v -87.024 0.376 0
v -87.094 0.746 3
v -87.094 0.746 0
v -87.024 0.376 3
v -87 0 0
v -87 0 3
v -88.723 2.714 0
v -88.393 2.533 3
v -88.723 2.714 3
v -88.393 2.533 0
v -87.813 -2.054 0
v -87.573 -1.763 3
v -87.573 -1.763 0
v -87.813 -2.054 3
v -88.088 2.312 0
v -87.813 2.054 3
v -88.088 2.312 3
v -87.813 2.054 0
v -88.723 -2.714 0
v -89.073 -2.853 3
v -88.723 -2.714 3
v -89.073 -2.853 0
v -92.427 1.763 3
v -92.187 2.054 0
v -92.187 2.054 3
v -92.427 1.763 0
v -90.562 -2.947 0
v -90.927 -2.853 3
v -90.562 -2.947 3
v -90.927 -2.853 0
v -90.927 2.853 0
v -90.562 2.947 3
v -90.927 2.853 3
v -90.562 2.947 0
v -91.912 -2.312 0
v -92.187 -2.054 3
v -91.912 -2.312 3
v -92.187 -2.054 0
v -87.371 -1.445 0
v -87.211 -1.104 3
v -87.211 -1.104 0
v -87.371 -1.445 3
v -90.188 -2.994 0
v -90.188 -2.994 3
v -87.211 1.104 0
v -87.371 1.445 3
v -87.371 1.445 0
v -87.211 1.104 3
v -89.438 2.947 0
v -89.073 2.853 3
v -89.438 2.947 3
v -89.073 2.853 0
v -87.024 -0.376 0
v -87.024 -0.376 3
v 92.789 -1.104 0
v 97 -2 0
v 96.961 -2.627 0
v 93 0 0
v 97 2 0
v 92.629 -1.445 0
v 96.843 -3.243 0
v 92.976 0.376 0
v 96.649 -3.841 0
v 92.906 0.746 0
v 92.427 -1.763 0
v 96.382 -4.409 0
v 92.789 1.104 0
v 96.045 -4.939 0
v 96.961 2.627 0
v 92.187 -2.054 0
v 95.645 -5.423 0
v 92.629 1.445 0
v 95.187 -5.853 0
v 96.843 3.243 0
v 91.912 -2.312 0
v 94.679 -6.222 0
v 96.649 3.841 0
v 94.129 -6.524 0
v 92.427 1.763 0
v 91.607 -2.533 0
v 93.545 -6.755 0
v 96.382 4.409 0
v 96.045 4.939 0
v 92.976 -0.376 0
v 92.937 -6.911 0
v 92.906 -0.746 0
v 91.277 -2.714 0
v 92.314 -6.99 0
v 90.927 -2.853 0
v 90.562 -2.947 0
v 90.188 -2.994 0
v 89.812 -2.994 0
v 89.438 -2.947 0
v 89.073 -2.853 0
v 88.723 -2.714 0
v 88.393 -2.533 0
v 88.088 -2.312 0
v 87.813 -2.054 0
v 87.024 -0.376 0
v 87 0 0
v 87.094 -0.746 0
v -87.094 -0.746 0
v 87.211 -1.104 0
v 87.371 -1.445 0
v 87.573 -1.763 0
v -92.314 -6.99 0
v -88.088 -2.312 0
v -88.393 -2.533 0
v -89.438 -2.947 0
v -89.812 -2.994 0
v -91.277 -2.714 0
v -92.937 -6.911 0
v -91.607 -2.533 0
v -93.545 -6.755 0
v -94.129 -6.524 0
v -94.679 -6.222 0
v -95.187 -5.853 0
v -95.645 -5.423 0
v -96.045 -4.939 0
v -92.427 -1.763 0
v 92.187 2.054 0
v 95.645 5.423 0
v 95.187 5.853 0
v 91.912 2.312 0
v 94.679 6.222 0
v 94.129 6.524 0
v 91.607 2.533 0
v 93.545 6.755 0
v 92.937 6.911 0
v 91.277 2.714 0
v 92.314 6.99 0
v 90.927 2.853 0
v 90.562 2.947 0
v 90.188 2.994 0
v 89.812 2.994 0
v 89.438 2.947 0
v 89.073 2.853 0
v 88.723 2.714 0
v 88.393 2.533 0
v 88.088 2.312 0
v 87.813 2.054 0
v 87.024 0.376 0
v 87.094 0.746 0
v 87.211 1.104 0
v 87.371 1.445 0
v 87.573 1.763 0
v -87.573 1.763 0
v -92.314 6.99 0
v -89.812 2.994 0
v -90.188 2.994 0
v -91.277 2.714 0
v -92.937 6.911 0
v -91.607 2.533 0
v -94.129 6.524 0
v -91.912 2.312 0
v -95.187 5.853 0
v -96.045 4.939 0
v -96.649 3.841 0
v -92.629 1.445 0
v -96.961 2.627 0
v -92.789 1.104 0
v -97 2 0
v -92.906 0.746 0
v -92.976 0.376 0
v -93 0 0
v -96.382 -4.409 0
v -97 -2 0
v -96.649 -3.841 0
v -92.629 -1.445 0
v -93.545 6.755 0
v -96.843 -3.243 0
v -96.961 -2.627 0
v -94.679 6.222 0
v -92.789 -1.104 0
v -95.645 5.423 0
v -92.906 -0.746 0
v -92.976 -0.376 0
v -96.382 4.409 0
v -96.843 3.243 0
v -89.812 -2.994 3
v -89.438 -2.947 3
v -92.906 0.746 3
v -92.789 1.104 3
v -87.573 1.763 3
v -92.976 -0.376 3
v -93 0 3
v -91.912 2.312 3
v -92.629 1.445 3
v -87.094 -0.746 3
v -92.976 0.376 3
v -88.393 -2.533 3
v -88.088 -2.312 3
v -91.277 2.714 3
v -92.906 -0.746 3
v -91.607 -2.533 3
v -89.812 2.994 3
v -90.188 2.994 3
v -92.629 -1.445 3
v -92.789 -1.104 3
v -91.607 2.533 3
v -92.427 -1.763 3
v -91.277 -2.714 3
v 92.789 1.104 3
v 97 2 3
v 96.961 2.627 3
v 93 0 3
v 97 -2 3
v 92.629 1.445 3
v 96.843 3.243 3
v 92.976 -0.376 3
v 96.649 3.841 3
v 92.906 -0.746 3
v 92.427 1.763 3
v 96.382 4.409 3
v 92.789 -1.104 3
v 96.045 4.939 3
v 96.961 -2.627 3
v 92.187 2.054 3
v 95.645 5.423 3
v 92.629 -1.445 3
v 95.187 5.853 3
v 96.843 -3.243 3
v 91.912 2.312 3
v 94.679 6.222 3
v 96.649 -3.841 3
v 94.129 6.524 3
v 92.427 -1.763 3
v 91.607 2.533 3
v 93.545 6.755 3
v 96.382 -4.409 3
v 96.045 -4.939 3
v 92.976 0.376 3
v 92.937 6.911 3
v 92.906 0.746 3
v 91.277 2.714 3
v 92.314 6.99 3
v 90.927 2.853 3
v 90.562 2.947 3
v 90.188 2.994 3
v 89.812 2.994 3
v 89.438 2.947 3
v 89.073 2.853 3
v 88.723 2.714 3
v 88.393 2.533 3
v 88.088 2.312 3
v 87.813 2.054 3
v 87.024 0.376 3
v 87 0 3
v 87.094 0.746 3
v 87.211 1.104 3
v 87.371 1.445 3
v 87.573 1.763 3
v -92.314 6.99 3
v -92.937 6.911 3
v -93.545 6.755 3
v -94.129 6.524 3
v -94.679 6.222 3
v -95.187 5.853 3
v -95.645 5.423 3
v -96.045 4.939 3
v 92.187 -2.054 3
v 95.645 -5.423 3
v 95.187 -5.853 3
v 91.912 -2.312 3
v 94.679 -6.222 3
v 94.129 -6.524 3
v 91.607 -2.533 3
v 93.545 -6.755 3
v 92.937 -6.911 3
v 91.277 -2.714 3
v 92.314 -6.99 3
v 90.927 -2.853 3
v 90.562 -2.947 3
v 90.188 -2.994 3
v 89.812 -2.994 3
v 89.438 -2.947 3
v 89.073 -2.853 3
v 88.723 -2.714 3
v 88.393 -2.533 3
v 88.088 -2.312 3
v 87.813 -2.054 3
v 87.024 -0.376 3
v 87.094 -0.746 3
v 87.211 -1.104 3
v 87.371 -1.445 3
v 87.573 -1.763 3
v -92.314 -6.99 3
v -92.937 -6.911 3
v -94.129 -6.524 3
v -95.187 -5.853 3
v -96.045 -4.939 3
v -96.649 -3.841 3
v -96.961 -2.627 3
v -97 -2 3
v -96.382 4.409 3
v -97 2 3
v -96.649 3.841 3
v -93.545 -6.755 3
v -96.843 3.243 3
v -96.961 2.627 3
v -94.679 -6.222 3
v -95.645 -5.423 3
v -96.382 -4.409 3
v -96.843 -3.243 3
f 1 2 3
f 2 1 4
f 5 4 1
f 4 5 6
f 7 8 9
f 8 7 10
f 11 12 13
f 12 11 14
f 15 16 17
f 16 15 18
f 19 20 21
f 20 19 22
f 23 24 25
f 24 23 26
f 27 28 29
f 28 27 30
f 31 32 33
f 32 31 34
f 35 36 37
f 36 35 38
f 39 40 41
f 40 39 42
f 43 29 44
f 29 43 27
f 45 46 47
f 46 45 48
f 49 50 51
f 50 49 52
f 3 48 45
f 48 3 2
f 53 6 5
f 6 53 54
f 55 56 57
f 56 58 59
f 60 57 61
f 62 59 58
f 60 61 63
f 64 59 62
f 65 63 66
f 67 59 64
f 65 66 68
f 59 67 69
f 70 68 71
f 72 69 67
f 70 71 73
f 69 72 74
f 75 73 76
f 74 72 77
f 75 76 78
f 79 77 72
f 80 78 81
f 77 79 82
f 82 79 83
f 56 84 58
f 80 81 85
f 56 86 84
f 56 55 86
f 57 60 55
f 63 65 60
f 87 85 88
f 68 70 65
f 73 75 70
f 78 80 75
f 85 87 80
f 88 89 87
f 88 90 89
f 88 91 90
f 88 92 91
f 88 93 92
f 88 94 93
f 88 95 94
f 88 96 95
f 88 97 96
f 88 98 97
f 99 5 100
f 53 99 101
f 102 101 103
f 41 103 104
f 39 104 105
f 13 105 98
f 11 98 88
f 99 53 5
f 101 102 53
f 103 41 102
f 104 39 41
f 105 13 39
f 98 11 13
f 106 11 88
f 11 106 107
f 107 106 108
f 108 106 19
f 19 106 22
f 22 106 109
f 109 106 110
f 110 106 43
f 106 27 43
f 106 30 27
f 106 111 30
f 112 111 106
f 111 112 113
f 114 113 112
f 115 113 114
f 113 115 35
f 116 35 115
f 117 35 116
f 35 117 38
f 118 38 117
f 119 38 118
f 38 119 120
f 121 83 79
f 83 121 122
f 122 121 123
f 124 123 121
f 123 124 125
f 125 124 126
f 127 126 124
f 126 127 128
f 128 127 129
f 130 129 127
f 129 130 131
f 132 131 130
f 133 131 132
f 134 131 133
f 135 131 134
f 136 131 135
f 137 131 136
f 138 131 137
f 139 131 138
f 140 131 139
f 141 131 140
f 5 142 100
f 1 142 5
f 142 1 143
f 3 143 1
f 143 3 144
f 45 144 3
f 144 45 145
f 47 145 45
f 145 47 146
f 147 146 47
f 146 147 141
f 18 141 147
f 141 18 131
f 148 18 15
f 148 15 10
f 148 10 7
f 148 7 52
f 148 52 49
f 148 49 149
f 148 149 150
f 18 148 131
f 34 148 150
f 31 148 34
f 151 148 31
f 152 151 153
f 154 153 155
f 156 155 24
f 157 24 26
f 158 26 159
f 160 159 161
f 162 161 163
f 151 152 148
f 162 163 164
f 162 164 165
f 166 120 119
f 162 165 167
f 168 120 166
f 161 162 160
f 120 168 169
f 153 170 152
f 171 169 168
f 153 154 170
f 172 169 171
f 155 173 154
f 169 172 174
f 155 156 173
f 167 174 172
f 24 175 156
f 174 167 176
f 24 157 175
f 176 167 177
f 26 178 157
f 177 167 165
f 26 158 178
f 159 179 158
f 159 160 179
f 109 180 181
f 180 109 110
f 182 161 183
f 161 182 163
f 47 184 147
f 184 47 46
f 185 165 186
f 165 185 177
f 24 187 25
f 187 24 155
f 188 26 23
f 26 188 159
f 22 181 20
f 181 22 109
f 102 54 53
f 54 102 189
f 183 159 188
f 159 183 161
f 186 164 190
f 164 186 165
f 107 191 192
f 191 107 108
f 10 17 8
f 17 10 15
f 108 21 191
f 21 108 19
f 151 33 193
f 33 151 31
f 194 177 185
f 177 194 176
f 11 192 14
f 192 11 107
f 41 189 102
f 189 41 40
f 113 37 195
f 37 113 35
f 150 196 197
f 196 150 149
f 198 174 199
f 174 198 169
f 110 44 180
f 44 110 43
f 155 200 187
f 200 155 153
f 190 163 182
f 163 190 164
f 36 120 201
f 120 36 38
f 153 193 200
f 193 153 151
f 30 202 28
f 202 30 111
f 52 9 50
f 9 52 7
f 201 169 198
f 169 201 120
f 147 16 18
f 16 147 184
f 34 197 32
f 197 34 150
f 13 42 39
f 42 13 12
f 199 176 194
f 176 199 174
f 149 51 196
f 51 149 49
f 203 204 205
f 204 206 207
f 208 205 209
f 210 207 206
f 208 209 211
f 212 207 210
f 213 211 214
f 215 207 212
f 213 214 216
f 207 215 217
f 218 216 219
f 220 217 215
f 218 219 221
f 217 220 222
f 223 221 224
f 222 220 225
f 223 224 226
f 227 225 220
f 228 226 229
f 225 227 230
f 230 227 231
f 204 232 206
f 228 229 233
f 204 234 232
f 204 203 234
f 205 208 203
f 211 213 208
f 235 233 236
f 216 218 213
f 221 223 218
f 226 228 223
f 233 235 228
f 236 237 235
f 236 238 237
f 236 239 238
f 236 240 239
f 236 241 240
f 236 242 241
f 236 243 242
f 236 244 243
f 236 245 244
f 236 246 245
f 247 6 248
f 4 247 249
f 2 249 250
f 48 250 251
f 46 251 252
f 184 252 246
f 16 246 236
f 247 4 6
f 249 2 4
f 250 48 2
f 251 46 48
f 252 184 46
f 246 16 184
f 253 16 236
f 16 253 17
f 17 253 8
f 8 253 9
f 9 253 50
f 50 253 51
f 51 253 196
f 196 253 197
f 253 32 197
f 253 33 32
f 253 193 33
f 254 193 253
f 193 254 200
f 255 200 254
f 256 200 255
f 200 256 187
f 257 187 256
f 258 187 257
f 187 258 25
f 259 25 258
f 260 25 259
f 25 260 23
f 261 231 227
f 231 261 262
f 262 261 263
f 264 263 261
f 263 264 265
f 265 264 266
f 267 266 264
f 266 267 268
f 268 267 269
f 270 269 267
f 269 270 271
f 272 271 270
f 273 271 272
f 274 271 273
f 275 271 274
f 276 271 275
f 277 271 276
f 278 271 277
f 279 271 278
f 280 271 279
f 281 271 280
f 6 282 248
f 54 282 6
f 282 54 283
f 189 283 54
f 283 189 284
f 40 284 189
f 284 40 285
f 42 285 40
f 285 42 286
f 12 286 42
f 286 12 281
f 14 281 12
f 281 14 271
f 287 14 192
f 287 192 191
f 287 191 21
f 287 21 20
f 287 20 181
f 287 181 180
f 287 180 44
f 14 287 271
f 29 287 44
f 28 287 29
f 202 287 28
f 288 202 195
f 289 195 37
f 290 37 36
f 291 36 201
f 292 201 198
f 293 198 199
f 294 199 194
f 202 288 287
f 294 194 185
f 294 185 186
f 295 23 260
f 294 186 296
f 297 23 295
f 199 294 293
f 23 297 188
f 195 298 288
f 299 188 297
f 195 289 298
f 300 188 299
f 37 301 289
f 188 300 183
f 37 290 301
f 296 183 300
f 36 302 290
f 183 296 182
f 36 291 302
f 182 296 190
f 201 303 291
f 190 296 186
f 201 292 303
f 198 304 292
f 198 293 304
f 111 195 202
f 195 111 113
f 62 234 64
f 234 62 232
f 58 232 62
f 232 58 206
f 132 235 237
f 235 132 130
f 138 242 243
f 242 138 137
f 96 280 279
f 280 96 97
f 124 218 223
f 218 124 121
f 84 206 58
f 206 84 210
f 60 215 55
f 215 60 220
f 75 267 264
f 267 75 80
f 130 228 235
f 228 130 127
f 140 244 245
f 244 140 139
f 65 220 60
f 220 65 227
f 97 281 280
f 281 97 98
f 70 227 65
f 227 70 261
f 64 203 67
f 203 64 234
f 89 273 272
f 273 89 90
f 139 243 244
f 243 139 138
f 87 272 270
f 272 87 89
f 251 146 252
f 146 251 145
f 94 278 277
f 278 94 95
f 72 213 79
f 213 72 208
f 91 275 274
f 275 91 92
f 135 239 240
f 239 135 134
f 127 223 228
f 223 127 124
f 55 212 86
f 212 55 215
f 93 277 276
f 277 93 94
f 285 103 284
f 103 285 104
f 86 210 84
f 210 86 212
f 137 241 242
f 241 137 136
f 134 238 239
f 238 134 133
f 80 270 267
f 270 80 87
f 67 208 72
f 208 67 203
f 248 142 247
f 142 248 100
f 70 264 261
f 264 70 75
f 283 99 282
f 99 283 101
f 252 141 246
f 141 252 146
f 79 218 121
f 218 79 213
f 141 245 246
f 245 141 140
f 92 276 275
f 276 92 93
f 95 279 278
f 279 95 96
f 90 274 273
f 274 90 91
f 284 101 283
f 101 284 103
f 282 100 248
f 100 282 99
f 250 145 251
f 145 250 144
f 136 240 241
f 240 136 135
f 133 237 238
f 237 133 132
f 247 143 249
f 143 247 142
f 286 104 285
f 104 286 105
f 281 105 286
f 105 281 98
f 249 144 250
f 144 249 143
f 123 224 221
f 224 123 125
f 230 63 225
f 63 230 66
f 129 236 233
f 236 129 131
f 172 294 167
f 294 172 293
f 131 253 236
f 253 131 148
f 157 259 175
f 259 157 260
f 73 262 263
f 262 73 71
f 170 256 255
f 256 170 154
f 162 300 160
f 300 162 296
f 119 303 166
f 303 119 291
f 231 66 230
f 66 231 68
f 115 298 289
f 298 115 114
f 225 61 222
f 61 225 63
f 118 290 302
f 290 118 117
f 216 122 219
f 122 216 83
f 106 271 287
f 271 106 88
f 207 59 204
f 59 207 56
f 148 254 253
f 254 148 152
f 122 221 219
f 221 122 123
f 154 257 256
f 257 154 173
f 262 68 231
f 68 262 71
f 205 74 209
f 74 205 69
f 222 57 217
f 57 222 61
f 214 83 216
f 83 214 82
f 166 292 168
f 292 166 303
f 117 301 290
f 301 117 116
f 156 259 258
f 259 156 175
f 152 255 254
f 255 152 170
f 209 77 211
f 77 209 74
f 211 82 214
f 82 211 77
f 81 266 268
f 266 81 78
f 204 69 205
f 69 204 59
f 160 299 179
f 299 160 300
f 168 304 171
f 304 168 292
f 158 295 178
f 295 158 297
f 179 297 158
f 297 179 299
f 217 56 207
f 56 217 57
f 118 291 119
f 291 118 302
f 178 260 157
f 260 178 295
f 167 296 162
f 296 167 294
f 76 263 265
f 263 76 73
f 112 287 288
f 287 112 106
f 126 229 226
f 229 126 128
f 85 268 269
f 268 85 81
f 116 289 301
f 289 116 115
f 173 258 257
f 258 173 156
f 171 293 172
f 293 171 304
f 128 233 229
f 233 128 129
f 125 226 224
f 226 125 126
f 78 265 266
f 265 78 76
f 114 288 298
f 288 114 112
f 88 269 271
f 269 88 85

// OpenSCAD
$fn = 50;


difference() {
	union() {
		hull() {
			translate(v = [-92.0000000000, 2.0000000000, 0]) {
				cylinder(h = 3, r = 5);
			}
			translate(v = [92.0000000000, 2.0000000000, 0]) {
				cylinder(h = 3, r = 5);
			}
			translate(v = [-92.0000000000, -2.0000000000, 0]) {
				cylinder(h = 3, r = 5);
			}
			translate(v = [92.0000000000, -2.0000000000, 0]) {
				cylinder(h = 3, r = 5);
			}
		}
	}
	union() {
		translate(v = [-90.0000000000, 0.0000000000, 0]) {
			cylinder(h = 3, r = 3.0000000000);
		}
		translate(v = [90.0000000000, 0.0000000000, 0]) {
			cylinder(h = 3, r = 3.0000000000);
		}
		translate(v = [-90.0000000000, 0.0000000000, 0]) {
			cylinder(h = 3, r = 1.5000000000);
		}
		translate(v = [90.0000000000, 0.0000000000, 0]) {
			cylinder(h = 3, r = 1.5000000000);
		}
		translate(v = [-90.0000000000, 0.0000000000, 0]) {
			cylinder(h = 3, r = 1.5000000000);
		}
		translate(v = [90.0000000000, 0.0000000000, 0]) {
			cylinder(h = 3, r = 1.5000000000);
		}
		translate(v = [-90.0000000000, 0.0000000000, 0]) {
			cylinder(h = 3, r = 1.5000000000);
		}
		translate(v = [90.0000000000, 0.0000000000, 0]) {
			cylinder(h = 3, r = 1.5000000000);
		}
	}
}
